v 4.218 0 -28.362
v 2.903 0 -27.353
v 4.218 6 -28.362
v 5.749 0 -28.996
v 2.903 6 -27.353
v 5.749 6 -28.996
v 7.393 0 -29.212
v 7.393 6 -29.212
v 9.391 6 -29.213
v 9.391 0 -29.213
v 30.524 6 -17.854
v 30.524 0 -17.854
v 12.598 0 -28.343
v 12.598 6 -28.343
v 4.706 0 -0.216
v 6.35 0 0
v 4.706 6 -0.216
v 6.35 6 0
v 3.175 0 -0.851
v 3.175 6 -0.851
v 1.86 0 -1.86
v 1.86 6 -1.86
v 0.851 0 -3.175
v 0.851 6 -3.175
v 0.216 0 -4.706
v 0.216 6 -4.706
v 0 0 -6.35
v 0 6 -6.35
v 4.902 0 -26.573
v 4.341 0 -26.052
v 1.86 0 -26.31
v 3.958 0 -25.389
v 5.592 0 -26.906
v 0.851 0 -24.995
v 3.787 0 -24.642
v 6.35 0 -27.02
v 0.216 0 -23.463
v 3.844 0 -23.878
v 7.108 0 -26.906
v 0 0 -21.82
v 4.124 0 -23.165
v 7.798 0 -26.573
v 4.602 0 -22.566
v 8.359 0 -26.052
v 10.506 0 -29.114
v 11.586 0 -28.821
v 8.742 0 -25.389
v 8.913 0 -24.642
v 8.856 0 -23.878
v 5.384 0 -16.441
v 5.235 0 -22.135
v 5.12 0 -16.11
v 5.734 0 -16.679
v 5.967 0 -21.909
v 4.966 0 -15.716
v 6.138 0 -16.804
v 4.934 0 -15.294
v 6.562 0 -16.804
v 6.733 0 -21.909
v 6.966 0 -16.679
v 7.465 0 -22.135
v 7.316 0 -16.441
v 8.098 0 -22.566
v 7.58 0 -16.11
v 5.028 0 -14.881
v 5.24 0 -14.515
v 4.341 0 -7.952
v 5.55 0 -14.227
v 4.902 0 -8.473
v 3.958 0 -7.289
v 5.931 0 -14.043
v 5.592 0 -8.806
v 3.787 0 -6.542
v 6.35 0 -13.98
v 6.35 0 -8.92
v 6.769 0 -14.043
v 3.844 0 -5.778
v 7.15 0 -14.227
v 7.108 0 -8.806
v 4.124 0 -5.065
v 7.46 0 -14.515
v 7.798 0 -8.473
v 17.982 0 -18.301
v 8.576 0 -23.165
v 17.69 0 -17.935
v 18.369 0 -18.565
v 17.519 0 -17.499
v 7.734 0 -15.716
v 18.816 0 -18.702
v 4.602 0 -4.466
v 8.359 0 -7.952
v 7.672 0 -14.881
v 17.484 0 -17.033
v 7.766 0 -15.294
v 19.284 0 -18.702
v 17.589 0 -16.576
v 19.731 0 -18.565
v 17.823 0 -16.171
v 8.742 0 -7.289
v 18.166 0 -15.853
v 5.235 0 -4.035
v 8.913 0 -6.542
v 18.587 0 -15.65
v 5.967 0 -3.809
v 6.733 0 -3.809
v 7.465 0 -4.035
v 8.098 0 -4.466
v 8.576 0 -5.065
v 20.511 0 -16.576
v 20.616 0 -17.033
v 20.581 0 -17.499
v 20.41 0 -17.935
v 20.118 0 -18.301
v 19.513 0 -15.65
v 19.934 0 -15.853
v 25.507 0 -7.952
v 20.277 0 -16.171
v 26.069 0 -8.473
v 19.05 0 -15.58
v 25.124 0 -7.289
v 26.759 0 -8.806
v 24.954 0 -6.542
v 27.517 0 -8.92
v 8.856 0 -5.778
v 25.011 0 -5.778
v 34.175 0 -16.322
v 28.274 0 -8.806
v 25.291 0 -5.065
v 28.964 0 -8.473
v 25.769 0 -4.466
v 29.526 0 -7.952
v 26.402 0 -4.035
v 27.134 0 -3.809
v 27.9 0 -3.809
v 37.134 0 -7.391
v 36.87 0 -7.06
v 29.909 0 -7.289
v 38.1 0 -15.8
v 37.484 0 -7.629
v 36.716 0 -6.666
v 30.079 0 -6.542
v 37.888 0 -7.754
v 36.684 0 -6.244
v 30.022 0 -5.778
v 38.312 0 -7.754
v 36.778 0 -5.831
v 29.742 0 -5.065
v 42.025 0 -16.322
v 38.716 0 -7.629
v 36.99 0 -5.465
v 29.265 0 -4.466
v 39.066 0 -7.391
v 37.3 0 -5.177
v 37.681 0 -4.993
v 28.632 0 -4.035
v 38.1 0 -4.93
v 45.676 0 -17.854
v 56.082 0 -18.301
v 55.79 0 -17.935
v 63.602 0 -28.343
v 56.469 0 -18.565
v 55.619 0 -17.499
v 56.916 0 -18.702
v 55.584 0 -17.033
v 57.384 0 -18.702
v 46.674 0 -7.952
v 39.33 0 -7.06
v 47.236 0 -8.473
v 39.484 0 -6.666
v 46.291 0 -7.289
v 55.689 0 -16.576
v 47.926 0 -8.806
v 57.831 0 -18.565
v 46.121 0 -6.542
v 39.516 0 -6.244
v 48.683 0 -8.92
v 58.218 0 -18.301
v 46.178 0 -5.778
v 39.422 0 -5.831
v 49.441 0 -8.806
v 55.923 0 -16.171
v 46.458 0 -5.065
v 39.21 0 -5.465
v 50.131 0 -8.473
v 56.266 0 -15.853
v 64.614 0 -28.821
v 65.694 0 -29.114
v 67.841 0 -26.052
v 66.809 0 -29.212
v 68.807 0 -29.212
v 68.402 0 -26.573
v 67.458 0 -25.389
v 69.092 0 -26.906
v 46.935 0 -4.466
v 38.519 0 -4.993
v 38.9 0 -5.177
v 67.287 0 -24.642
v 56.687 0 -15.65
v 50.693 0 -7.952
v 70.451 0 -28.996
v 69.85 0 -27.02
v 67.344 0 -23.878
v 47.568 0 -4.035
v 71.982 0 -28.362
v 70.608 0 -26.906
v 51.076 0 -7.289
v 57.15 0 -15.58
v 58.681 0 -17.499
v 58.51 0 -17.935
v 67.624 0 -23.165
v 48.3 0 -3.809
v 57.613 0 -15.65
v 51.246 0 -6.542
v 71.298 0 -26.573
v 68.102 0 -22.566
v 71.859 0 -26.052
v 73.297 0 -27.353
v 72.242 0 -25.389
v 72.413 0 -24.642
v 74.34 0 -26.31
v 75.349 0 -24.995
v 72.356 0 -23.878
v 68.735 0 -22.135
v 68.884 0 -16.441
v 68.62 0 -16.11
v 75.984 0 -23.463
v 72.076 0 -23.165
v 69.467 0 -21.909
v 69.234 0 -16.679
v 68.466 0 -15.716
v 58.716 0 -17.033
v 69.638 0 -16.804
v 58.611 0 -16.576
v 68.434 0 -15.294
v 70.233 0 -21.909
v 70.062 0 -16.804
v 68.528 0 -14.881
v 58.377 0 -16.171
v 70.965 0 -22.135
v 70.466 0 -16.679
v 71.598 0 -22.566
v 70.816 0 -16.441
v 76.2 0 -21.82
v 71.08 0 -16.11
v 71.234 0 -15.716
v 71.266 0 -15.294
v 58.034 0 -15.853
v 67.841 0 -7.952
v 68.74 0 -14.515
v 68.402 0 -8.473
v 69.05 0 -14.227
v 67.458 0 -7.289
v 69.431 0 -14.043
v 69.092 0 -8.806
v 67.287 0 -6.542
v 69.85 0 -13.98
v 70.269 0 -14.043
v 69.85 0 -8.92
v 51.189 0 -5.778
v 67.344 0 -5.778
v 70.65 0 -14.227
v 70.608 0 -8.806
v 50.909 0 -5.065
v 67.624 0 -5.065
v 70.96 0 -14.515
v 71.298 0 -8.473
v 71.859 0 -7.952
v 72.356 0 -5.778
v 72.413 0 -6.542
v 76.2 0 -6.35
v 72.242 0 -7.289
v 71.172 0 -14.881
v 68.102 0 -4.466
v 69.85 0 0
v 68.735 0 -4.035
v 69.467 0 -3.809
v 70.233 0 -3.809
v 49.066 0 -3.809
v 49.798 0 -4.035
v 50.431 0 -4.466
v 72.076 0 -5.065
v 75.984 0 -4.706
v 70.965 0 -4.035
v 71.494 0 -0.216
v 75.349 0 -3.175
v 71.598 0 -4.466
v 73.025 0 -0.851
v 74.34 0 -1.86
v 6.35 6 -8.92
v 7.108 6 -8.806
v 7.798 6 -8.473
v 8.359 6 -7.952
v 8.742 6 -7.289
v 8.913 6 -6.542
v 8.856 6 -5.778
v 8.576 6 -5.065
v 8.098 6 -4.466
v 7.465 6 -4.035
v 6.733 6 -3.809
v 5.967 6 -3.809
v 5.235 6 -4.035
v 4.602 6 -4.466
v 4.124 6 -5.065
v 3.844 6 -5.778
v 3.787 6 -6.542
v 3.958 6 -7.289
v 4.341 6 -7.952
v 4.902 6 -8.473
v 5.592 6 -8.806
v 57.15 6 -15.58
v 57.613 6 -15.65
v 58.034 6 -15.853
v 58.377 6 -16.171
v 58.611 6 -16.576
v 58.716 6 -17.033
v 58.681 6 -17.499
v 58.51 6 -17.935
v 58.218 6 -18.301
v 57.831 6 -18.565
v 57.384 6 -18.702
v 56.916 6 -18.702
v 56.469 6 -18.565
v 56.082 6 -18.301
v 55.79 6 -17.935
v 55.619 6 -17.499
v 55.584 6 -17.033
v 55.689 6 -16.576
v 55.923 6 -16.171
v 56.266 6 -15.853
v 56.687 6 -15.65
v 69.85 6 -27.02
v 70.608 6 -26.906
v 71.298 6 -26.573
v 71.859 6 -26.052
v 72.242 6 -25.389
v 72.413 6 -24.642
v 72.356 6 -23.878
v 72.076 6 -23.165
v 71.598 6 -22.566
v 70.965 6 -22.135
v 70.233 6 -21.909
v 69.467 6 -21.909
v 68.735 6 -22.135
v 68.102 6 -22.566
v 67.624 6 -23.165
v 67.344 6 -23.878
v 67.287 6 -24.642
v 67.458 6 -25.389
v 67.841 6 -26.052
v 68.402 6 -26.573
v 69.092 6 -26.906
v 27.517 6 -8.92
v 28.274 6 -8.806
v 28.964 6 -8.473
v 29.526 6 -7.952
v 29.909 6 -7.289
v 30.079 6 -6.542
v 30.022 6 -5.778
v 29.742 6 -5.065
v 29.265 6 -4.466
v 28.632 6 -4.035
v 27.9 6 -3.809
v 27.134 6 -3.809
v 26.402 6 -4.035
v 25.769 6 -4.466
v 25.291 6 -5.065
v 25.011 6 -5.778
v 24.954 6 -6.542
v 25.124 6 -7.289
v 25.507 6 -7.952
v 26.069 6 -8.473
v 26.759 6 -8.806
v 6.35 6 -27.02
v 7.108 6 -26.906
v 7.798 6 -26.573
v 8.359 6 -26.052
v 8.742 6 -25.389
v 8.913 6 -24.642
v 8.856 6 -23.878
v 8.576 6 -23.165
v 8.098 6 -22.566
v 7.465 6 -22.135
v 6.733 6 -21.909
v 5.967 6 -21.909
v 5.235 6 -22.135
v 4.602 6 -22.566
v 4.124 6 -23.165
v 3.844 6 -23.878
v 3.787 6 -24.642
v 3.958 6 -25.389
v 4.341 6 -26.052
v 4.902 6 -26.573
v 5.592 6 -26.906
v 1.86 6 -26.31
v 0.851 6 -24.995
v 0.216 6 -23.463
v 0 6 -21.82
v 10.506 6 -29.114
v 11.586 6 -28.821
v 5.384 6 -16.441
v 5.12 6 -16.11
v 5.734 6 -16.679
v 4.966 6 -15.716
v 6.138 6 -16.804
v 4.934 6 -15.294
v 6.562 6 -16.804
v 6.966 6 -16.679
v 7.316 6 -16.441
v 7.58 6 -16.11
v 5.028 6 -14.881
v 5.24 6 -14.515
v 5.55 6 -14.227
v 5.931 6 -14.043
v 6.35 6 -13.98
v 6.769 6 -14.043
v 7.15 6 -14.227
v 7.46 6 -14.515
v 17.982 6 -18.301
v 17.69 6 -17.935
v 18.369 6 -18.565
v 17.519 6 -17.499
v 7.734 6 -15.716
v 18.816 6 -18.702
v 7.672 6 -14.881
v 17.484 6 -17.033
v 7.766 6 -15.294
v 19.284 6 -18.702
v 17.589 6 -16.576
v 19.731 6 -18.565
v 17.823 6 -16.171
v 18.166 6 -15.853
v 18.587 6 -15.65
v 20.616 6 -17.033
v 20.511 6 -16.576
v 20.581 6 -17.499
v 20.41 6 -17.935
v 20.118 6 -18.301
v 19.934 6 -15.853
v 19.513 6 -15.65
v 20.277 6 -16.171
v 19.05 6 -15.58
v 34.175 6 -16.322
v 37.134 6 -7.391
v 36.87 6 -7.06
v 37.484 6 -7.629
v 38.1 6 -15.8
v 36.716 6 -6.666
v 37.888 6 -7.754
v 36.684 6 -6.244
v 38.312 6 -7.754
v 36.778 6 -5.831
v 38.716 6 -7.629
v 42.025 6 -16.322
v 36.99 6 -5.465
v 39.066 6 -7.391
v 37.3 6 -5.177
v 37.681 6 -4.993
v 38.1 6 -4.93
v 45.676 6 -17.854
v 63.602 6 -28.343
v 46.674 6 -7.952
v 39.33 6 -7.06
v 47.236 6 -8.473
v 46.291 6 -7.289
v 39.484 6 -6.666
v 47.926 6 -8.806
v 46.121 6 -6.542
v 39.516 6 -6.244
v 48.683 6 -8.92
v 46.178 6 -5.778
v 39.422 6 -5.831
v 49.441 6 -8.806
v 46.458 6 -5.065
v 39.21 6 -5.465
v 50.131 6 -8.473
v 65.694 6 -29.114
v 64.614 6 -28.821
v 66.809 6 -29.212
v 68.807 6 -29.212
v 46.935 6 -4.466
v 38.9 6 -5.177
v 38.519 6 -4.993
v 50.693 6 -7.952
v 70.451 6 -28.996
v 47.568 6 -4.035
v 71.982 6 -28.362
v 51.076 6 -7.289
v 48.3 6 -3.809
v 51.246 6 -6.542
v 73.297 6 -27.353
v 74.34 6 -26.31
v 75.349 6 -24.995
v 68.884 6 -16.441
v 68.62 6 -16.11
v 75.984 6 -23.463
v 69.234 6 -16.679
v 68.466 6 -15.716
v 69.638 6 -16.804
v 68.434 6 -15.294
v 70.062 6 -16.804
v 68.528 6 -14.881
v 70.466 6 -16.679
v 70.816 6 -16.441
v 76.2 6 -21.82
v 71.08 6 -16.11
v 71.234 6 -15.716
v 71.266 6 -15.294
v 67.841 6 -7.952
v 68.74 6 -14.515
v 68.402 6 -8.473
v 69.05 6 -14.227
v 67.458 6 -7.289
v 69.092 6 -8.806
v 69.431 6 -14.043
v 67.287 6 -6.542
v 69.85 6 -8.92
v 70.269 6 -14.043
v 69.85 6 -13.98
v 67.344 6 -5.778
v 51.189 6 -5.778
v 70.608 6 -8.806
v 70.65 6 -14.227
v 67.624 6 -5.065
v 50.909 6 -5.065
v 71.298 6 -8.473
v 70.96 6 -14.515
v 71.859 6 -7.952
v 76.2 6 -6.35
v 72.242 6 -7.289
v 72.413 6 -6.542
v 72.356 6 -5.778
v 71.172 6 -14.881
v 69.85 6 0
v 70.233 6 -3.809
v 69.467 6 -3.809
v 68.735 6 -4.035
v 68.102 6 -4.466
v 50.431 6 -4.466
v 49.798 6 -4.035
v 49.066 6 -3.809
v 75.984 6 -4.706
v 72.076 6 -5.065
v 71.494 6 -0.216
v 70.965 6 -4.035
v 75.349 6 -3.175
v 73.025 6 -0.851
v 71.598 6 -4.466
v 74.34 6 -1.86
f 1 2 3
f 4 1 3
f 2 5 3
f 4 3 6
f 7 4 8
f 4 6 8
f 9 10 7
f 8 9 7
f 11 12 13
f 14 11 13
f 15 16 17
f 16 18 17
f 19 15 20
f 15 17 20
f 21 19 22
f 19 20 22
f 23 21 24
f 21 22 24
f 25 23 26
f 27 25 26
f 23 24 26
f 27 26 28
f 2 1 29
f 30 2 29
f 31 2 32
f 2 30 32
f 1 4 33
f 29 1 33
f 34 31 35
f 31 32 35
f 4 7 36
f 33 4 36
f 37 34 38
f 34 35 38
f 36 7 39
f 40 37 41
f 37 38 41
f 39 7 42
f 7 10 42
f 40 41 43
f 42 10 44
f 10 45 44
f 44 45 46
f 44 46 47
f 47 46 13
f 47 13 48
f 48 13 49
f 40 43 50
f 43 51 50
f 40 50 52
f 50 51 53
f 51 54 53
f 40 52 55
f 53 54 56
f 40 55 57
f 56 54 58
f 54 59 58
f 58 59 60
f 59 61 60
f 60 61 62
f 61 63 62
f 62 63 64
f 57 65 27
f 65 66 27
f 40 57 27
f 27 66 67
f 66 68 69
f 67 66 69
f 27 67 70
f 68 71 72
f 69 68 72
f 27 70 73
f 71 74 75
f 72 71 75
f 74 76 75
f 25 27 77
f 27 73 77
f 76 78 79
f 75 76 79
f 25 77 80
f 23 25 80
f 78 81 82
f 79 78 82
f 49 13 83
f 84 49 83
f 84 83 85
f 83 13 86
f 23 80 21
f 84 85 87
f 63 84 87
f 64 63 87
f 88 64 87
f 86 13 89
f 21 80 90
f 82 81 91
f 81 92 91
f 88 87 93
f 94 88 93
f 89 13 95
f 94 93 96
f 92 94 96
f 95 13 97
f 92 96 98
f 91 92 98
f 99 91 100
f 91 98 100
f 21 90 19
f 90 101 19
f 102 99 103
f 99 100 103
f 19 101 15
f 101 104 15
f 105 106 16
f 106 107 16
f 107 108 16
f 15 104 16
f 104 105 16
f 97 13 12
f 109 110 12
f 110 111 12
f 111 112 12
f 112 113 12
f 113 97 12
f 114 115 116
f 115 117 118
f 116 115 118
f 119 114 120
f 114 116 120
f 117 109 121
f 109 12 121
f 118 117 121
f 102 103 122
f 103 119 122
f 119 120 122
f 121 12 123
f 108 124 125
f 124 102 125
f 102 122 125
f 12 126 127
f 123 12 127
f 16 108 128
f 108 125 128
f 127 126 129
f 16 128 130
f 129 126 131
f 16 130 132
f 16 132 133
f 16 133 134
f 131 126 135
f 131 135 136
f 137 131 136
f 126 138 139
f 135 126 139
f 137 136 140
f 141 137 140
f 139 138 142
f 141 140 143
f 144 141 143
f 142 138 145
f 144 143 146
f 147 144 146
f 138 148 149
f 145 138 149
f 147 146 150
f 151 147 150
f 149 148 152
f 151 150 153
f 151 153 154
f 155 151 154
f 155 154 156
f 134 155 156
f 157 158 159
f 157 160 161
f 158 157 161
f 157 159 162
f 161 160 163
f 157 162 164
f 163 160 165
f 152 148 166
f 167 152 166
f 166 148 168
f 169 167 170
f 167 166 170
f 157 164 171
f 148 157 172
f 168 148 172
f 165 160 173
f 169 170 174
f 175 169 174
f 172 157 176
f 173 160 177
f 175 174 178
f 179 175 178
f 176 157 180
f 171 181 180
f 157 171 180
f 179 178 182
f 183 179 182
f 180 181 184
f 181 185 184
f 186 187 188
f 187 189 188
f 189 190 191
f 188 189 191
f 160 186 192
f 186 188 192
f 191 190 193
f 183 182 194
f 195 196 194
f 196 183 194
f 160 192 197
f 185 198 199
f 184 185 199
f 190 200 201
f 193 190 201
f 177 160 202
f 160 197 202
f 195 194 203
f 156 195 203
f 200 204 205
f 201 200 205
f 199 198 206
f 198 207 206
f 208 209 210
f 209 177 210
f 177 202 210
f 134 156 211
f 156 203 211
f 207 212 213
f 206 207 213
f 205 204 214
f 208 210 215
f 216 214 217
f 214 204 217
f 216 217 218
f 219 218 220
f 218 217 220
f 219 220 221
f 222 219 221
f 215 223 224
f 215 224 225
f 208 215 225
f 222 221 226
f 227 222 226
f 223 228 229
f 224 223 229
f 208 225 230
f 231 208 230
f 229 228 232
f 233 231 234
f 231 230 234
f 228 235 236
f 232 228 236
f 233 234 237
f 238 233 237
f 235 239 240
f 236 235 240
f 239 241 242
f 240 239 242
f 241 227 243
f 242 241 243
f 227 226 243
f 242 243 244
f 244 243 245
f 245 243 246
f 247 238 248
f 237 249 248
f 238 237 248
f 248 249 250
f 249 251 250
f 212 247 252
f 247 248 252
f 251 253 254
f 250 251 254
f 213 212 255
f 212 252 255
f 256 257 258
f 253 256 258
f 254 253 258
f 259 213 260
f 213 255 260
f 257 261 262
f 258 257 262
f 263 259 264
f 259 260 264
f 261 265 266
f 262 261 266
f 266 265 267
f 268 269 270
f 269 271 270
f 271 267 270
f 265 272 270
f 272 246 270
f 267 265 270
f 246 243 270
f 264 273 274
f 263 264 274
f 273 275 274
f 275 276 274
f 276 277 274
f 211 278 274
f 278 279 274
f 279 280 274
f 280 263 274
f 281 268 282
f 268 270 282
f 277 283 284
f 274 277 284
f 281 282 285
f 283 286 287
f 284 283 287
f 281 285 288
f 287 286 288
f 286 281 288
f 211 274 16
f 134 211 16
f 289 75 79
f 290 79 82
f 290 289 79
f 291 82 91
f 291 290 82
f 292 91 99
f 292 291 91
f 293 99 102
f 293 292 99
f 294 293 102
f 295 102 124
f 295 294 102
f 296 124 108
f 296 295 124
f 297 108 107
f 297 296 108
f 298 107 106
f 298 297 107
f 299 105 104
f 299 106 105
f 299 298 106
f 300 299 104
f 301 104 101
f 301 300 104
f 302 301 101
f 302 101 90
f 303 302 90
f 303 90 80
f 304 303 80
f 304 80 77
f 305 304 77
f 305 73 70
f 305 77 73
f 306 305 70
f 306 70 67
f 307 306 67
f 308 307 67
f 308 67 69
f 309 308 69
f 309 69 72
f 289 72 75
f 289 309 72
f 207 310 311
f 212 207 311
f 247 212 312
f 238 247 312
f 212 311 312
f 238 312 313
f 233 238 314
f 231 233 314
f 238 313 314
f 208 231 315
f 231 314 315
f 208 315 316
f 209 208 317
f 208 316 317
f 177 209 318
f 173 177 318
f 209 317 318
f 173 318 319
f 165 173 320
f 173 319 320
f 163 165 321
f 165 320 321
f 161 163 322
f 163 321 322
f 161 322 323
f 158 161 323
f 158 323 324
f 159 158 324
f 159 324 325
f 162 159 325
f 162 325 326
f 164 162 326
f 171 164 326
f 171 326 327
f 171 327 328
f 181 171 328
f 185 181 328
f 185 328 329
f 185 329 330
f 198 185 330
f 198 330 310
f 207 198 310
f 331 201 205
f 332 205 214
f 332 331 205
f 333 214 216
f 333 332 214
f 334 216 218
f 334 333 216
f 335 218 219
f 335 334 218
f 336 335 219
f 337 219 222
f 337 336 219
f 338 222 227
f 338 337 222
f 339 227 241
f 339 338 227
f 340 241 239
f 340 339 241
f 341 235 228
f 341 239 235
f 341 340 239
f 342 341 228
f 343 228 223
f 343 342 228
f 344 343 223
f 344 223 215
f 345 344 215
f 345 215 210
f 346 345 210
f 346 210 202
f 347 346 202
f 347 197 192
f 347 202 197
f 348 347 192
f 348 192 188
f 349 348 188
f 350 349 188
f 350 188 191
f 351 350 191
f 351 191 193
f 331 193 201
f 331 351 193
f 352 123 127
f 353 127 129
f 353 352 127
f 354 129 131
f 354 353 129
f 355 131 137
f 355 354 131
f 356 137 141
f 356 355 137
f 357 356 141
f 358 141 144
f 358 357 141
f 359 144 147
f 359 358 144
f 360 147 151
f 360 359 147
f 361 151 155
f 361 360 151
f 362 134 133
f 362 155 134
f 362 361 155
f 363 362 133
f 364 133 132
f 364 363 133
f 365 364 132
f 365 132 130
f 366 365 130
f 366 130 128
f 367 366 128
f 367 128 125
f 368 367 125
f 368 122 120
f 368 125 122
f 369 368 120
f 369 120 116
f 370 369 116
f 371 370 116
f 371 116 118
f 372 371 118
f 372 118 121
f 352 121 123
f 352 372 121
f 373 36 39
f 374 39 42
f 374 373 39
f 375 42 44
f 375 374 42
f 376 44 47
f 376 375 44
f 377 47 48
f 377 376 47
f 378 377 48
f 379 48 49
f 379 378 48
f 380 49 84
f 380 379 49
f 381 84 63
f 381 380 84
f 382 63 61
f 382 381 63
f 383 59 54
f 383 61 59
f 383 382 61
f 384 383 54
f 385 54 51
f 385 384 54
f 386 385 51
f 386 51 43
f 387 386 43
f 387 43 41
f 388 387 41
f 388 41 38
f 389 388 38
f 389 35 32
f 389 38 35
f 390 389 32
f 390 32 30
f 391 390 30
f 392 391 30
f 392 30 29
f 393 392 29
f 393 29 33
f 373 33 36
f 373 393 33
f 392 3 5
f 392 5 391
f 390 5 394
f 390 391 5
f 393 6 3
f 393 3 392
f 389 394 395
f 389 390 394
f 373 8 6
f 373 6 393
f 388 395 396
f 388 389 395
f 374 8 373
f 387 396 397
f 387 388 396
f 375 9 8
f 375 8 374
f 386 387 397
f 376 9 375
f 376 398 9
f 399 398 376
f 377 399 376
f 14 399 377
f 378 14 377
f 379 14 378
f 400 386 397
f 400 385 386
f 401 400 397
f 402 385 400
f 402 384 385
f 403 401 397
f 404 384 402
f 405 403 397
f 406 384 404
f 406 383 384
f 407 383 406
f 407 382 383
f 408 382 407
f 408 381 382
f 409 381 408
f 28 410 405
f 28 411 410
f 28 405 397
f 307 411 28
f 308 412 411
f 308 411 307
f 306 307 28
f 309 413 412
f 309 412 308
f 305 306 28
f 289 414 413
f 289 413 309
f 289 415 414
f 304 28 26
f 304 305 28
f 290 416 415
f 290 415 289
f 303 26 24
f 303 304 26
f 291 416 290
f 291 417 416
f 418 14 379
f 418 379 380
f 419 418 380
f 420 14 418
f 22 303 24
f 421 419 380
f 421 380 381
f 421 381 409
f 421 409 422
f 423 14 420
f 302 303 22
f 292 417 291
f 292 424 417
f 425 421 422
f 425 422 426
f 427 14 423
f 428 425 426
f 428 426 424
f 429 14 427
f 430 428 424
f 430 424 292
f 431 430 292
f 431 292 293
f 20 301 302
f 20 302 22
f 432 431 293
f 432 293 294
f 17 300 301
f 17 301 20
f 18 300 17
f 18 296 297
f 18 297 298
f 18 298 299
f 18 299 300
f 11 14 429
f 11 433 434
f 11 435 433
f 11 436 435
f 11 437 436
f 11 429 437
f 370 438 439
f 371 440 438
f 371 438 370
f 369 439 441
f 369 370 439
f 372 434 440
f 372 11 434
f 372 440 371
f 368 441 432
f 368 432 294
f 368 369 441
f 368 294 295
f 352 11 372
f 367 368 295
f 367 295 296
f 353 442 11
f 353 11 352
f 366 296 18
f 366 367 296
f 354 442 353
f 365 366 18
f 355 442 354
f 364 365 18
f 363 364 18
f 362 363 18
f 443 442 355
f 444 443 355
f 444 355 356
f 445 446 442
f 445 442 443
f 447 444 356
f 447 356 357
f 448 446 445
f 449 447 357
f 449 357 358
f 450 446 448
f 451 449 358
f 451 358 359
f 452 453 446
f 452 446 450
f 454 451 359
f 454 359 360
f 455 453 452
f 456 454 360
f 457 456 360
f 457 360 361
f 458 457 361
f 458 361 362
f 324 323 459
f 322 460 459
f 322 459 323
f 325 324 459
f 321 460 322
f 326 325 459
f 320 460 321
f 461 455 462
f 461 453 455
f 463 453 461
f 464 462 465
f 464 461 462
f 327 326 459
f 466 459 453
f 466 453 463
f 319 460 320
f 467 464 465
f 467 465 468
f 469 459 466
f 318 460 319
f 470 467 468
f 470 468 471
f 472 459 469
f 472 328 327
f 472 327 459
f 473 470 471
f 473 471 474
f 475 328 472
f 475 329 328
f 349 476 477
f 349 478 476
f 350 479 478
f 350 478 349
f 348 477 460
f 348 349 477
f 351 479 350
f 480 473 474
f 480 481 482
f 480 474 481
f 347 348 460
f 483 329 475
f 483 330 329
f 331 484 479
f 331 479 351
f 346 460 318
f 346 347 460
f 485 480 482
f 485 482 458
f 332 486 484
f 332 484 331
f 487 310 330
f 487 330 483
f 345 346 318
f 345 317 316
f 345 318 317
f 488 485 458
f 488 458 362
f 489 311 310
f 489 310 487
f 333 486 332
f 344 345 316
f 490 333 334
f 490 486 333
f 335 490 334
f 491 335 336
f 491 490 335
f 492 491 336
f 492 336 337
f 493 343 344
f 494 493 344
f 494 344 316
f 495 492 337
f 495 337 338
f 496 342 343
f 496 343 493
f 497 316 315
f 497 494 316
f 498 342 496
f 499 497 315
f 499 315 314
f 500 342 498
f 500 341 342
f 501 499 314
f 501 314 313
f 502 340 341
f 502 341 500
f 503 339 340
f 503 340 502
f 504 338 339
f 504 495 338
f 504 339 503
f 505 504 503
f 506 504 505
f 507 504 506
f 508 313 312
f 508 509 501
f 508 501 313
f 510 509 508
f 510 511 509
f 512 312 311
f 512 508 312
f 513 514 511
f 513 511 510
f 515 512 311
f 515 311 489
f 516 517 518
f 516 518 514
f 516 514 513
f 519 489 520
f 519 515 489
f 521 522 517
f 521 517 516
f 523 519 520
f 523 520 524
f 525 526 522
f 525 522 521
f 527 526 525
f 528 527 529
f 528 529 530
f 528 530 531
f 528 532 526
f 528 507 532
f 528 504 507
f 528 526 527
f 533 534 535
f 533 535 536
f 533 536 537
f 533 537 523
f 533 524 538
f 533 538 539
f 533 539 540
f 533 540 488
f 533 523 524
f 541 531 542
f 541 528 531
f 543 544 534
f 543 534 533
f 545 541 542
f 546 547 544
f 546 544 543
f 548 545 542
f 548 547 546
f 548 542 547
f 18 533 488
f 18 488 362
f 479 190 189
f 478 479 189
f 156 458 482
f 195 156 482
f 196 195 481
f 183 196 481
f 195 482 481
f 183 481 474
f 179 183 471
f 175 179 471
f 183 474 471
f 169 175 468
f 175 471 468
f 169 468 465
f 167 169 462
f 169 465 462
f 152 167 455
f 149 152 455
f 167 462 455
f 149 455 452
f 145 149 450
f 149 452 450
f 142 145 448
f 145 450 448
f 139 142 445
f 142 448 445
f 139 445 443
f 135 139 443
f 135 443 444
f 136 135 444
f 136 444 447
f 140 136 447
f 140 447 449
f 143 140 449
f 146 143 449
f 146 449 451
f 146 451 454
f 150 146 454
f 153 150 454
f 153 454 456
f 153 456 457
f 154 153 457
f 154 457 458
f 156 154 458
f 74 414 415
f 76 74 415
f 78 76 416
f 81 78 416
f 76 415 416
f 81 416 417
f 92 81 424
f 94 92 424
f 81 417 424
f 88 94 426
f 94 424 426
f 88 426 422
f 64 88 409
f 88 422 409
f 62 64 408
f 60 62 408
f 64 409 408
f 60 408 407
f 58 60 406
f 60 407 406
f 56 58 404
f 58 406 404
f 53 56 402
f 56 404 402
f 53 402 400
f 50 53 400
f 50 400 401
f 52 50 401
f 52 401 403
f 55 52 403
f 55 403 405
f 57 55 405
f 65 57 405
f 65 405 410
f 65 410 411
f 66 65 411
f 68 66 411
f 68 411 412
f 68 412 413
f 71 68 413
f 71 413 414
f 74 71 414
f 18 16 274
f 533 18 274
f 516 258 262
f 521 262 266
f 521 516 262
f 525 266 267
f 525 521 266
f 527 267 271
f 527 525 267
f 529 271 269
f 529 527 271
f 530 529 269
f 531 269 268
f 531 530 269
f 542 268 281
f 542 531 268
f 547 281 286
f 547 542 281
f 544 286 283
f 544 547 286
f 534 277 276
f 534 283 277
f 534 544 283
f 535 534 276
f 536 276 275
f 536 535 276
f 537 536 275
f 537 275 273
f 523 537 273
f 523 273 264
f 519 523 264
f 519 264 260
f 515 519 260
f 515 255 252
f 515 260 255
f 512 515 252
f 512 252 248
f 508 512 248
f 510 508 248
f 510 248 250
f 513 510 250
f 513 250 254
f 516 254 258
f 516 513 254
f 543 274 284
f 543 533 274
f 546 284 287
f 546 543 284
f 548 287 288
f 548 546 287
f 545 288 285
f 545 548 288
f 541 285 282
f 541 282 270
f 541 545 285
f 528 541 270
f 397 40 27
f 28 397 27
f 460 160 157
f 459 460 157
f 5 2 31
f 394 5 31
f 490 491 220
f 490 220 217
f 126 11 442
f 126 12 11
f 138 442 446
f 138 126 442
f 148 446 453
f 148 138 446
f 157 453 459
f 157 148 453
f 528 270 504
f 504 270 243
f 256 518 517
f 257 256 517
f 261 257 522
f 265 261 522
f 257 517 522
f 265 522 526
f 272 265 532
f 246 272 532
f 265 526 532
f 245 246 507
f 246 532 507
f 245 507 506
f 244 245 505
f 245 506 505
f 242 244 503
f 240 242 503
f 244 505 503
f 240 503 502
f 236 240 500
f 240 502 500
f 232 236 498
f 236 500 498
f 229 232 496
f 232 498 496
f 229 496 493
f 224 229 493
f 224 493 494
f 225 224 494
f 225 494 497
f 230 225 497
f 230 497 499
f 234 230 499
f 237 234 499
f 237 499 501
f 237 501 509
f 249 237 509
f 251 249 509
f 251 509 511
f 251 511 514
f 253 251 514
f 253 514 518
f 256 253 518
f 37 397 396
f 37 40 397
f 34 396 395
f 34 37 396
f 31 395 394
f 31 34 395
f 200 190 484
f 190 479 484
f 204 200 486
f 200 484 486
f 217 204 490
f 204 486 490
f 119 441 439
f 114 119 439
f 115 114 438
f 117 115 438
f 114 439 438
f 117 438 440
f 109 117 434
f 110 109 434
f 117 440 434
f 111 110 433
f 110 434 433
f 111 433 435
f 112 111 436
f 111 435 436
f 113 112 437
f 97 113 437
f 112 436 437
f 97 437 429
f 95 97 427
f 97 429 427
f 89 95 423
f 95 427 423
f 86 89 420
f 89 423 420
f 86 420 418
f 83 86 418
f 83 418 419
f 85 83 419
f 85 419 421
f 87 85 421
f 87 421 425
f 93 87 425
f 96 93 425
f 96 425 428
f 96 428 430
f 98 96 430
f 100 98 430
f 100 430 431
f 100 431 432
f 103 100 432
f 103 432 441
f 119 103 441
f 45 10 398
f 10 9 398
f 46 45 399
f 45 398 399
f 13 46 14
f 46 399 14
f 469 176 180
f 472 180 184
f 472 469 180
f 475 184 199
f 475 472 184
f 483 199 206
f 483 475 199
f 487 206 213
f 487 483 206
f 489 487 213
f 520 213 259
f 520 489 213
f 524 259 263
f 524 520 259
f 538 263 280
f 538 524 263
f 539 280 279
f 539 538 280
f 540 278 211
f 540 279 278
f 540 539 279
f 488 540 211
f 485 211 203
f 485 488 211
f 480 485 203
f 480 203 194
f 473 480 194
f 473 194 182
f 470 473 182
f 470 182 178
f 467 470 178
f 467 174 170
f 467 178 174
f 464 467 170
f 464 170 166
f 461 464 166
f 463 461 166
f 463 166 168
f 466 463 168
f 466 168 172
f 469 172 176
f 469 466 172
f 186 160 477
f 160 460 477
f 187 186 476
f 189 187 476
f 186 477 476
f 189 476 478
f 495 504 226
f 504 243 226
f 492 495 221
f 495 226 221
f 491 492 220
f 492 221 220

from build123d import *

# Parameters (mm, degrees)
SKETCH1_R           = 15
BOSS_EXTRUDE1_DEPTH = 6
SKETCH2_R           = 1.5
CUT_EXTRUDE1_DEPTH  = 92.777339251
CUT_EXTRUDE2_DEPTH  = 92.777339251
SKETCH13_R          = 1.65
M4_TAP_DEPTH        = 85.985660555
SKETCH15_R          = 2.65
M5_THROUGH_DEPTH    = 83.615146916
FILLET1_R           = 6.35
CUT_EXTRUDE4_START  = -10
CUT_EXTRUDE4_DEPTH  = 10
FILLET2_R           = 6.35
SKETCH17_R          = 1.5
CUT_EXTRUDE5_DEPTH  = 82.827930172
MOVE_FACE1_BY       = 0.08
MOVE_FACE1_2_BY     = 0.08
MOVE_FACE1_3_BY     = 0.08
MOVE_FACE1_4_BY     = 0.08
MOVE_FACE1_5_BY     = 0.08
MOVE_FACE1_6_BY     = 0.08
MOVE_FACE1_7_BY     = 0.08
MOVE_FACE1_8_BY     = 0.08
MOVE_FACE1_9_BY     = 0.08
MOVE_FACE1_10_BY    = 0.08
MOVE_FACE1_11_BY    = 0.08


with BuildPart() as part:
    # Sketch1 → Boss-Extrude1 (new body)
    with BuildSketch(Plane(origin=(0, 0, 0), x_dir=(1, 0, 0), z_dir=(0, 1, 0))):
        Polygon((0, 0), (76.2, 0), (76.2, 50.8), (38.1, 50.8), (0, 50.8), align=None)
        with Locations(Location((38.1, 30.8, 0), (0, 0, 270))):
            Circle(SKETCH1_R, mode=Mode.SUBTRACT)
    extrude(amount=BOSS_EXTRUDE1_DEPTH)

    # Sketch2 → Cut-Extrude1 (cut, through all)
    with BuildSketch(Plane(origin=(0, 6, 0), x_dir=(1, 0, 0), z_dir=(0, 1, 0))):
        with Locations(Location((19.05, 30.8, 0), (0, 0, 270))):
            Circle(SKETCH2_R)
        with Locations(Location((57.15, 30.8, 0), (0, 0, 90))):
            Circle(SKETCH2_R)
    extrude(amount=-CUT_EXTRUDE1_DEPTH, mode=Mode.SUBTRACT)

    # Sketch9 → Cut-Extrude2 (cut, through all)
    with BuildSketch(Plane(origin=(0, 6, 0), x_dir=(1, 0, 0), z_dir=(0, 1, 0))):
        with BuildLine():
            Line((0, 50.8), (76.2, 50.8))
            Line((76.2, 50.8), (76.2, 24.45))
            Line((76.2, 24.45), (63.5, 37.15))
            Line((63.5, 37.15), (53.1, 37.15))
            Line((53.1, 37.15), (53.1, 30.8))
            ThreePointArc((53.1, 30.8), (38.1, 15.8), (23.1, 30.8))
            Line((23.1, 30.8), (23.1, 37.15))
            Line((23.1, 37.15), (12.7, 37.15))
            Line((12.7, 37.15), (0, 24.45))
            Line((0, 24.45), (0, 50.8))
        make_face()
    extrude(amount=-CUT_EXTRUDE2_DEPTH, mode=Mode.SUBTRACT)

    # Sketch13 → M4-tap (cut, through all)
    with BuildSketch(Plane(origin=(0, 6, 0), x_dir=(1, 0, 0), z_dir=(0, 1, 0))):
        with Locations(Location((19.05, 17.15, 0), (0, 0, 270))):
            Circle(SKETCH13_R)
        with Locations(Location((57.15, 17.15, 0), (0, 0, 270))):
            Circle(SKETCH13_R)
    extrude(amount=-M4_TAP_DEPTH, mode=Mode.SUBTRACT)

    # Sketch15 → M5-through (cut, through all)
    with BuildSketch(Plane(origin=(0, 6, -5.8), x_dir=(1, 0, 0), z_dir=(0, -1, 0))):
        with Locations(Location((6.35, -18.65, 0), (0, 0, 270))):
            Circle(SKETCH15_R)
        with Locations(Location((6.35, -0.55, 0), (0, 0, 270))):
            Circle(SKETCH15_R)
        with Locations(Location((27.516666667, -0.55, 0), (0, 0, 270))):
            Circle(SKETCH15_R)
        with Locations(Location((48.683333333, -0.55, 0), (0, 0, 270))):
            Circle(SKETCH15_R)
        with Locations(Location((69.85, -0.55, 0), (0, 0, 270))):
            Circle(SKETCH15_R)
        with Locations(Location((69.85, -18.65, 0), (0, 0, 270))):
            Circle(SKETCH15_R)
    extrude(amount=M5_THROUGH_DEPTH, mode=Mode.SUBTRACT)

    # Fillet1
    fillet1_edges = [part.edges().sort_by_distance(p)[0] for p in [
        (76.2, 3, 0),
        (0, 3, 0),
        (0, 3, -24.45),
        (76.2, 3, -24.45),
        (63.5, 3, -37.15),
        (53.1, 3, -37.15),
        (23.1, 3, -37.15),
        (12.7, 3, -37.15),
    ]]
    fillet(fillet1_edges, radius=FILLET1_R - 0.0001)  # a hair under: the kernel refuses the full size

    # Sketch16 → Cut-Extrude4 (cut)
    with BuildSketch(Plane(origin=(0, 6, 0), x_dir=(1, 0, 0), z_dir=(0, 1, 0)).offset(CUT_EXTRUDE4_START)):
        with BuildLine():
            Line((30.524360743, 17.853583899), (11.1125, 29.2125))
            Line((11.1125, 29.2125), (4.7625, 29.2125))
            Line((4.7625, 29.2125), (38.1, 62.55))
            Line((38.1, 62.55), (71.4375, 29.2125))
            Line((71.4375, 29.2125), (65.0875, 29.2125))
            Line((65.0875, 29.2125), (45.675639257, 17.853583899))
            ThreePointArc((45.675639257, 17.853583899), (38.1, 15.8), (30.524360743, 17.853583899))
        make_face()
    extrude(amount=CUT_EXTRUDE4_DEPTH, mode=Mode.SUBTRACT)

    # Fillet2
    fillet2_edges = [part.edges().sort_by_distance(p)[0] for p in [
        (11.1125, 3, -29.2125),
        (4.7625, 3, -29.2125),
        (71.4375, 3, -29.2125),
        (65.0875, 3, -29.2125),
    ]]
    fillet(fillet2_edges, radius=FILLET2_R)

    # Sketch17 → Cut-Extrude5 (cut, through all)
    with BuildSketch(Plane(origin=(0, 6, 0), x_dir=(-1, 0, 0), z_dir=(0, 1, 0))):
        with Locations(Location((-6.35, -15.4, 0), (0, 0, 90))):
            Circle(SKETCH17_R)
        with Locations(Location((-38.1, -6.35, 0), (0, 0, 90))):
            Circle(SKETCH17_R)
        with Locations(Location((-69.85, -15.4, 0), (0, 0, 90))):
            Circle(SKETCH17_R)
    extrude(amount=-CUT_EXTRUDE5_DEPTH, mode=Mode.SUBTRACT)

    # Move Face1: a curved face moved outward by 0.08
    add(Solid.thicken(part.faces().sort_by_distance((6.35, 3, -21.8))[0], MOVE_FACE1_BY))

    # Move Face1 2: a curved face moved outward by 0.08
    add(Solid.thicken(part.faces().sort_by_distance((19.05, 3, -18.8))[0], MOVE_FACE1_2_BY))

    # Move Face1 3: a curved face moved outward by 0.08
    add(Solid.thicken(part.faces().sort_by_distance((57.15, 3, -18.8))[0], MOVE_FACE1_3_BY))

    # Move Face1 4: a curved face moved outward by 0.08
    add(Solid.thicken(part.faces().sort_by_distance((6.35, 3, -3.7))[0], MOVE_FACE1_4_BY))

    # Move Face1 5: a curved face moved outward by 0.08
    add(Solid.thicken(part.faces().sort_by_distance((27.516666667, 3, -3.7))[0], MOVE_FACE1_5_BY))

    # Move Face1 6: a curved face moved outward by 0.08
    add(Solid.thicken(part.faces().sort_by_distance((48.683333333, 3, -3.7))[0], MOVE_FACE1_6_BY))

    # Move Face1 7: a curved face moved outward by 0.08
    add(Solid.thicken(part.faces().sort_by_distance((69.85, 3, -3.7))[0], MOVE_FACE1_7_BY))

    # Move Face1 8: a curved face moved outward by 0.08
    add(Solid.thicken(part.faces().sort_by_distance((69.85, 3, -21.8))[0], MOVE_FACE1_8_BY))

    # Move Face1 9: a curved face moved outward by 0.08
    add(Solid.thicken(part.faces().sort_by_distance((6.35, 3, -16.9))[0], MOVE_FACE1_9_BY))

    # Move Face1 10: a curved face moved outward by 0.08
    add(Solid.thicken(part.faces().sort_by_distance((38.1, 3, -7.85))[0], MOVE_FACE1_10_BY))

    # Move Face1 11: a curved face moved outward by 0.08
    add(Solid.thicken(part.faces().sort_by_distance((69.85, 3, -16.9))[0], MOVE_FACE1_11_BY))


solid = part.part
